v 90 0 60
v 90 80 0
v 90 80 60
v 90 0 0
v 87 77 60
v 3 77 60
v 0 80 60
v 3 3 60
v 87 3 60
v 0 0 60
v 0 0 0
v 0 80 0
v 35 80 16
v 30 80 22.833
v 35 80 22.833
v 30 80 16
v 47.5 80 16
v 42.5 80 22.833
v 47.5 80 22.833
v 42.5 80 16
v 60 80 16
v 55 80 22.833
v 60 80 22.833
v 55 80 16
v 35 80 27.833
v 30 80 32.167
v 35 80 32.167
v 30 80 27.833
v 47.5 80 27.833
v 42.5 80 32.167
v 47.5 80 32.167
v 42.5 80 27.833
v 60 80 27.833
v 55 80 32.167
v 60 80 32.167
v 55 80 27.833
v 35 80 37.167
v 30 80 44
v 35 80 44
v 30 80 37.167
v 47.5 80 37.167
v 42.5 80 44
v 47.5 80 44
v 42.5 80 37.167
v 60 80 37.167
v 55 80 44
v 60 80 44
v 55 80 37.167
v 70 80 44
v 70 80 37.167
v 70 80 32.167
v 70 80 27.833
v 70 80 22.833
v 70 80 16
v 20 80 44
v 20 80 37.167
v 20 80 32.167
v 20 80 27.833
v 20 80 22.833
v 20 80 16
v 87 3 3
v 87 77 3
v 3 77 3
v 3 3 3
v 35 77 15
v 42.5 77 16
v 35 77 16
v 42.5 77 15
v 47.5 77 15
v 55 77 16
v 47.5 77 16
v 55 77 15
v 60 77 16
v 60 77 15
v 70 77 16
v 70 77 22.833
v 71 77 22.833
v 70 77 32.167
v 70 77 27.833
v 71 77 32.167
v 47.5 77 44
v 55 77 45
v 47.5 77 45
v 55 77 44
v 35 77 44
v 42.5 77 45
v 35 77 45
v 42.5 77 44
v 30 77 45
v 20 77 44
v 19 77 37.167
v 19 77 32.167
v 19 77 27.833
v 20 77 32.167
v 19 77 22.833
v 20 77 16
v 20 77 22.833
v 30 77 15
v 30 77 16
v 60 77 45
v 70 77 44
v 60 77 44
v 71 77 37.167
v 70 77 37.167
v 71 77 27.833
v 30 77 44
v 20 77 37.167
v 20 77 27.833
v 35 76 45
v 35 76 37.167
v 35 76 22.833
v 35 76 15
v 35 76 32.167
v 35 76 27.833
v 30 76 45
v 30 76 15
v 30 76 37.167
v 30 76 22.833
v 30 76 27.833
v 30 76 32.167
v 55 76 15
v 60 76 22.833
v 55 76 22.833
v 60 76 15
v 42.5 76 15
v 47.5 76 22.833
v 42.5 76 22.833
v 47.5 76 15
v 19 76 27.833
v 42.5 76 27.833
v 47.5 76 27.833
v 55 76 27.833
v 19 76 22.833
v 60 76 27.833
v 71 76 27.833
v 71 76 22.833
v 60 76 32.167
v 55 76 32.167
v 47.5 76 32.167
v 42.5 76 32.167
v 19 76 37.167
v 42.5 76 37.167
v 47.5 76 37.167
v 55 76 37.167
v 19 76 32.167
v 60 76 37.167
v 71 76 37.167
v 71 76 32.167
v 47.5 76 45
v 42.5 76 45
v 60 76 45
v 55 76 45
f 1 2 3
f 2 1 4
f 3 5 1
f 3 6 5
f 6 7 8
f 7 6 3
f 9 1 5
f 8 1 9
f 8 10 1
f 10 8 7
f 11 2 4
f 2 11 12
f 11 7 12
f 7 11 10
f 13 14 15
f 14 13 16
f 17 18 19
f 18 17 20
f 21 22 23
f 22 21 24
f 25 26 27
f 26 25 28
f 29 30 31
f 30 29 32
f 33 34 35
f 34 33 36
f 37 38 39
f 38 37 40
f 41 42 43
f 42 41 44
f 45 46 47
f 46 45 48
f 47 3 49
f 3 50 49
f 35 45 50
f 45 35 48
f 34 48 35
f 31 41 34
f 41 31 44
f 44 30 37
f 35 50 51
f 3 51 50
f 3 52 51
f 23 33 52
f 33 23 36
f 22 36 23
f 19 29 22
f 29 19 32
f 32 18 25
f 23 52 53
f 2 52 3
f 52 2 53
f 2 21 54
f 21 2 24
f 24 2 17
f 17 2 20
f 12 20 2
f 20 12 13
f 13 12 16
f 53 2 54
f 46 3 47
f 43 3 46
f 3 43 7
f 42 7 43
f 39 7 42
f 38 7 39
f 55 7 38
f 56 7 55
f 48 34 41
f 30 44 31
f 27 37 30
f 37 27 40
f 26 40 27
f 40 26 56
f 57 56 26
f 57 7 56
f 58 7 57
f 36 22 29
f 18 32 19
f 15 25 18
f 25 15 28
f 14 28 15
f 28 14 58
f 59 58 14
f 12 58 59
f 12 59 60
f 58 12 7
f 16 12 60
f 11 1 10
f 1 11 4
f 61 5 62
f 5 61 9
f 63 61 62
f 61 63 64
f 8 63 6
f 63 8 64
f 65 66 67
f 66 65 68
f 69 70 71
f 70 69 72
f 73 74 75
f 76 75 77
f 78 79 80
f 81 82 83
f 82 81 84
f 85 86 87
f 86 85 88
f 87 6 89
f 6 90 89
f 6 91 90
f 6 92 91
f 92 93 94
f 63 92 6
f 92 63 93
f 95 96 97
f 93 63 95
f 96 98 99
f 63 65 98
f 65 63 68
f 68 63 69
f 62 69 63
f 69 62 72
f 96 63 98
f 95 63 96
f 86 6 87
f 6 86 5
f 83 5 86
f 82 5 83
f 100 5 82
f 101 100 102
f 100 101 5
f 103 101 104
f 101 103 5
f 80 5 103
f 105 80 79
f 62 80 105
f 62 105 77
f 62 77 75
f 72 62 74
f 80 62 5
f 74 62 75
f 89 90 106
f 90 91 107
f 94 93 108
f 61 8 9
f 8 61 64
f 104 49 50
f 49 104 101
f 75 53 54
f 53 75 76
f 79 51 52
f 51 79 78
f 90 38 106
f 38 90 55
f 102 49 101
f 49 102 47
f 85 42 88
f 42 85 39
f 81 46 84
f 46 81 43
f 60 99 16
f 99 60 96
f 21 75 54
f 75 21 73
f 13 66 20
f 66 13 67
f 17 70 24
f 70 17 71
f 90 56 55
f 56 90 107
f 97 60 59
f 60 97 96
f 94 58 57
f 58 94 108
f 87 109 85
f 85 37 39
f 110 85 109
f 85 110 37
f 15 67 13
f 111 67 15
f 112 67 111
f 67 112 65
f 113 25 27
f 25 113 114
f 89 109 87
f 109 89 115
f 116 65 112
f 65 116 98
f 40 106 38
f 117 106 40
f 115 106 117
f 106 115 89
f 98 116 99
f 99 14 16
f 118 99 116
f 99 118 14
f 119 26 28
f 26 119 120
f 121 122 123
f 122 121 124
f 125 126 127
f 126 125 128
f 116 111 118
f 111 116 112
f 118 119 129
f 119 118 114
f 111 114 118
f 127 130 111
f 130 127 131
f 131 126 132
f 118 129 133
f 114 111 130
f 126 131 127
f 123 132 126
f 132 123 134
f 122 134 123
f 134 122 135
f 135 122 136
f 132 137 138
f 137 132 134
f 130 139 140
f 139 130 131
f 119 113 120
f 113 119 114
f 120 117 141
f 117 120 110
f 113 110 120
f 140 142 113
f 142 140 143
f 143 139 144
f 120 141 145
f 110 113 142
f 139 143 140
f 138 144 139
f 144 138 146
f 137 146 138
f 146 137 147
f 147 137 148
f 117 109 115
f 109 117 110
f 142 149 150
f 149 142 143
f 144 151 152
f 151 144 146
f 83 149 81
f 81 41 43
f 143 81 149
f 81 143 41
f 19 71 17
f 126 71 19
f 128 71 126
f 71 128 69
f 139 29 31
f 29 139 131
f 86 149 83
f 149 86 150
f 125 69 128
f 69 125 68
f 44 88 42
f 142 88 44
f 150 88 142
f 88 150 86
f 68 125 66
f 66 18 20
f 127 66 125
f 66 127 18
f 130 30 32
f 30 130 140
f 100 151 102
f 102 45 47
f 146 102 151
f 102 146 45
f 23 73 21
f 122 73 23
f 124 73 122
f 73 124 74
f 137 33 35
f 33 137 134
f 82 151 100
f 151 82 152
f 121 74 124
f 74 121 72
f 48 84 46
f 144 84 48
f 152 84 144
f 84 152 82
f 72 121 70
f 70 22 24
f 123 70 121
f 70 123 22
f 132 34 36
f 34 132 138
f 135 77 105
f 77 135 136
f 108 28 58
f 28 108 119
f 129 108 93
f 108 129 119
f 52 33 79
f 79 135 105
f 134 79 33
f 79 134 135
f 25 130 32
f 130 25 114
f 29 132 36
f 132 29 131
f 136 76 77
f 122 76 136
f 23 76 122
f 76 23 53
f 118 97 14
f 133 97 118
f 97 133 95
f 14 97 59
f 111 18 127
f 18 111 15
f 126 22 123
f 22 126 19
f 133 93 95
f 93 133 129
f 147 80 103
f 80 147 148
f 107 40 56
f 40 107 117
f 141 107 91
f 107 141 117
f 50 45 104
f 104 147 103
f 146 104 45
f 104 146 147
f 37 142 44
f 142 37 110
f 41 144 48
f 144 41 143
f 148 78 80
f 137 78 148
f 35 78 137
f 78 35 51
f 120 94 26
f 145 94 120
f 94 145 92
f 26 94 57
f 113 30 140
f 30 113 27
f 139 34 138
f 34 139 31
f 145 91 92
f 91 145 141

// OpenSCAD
$fn = 32;

// ----------------------------------------------------------------------
// Vent box: crossgrid enclosure
// ----------------------------------------------------------------------

// --- parameters (mm) ---
box_l = 90;               // box length, X
box_w = 80;               // box width, Y
box_h = 60;               // box height, Z
wall_t = 3;               // shell wall thickness
win_l = 50;               // vent window width, X
win_h = 28;               // vent window height, Z
bar_w = 5;                // grid bar width
n_v = 3;                  // vertical bar count
n_h = 2;                  // horizontal bar count
fit_tol = 0.1;            // tolerance for press fits, mm
free_tol = 0.3;           // tolerance for clearance fits, mm

win_z0 = (box_h - win_h) / 2;  // window lower edge Z
v_step = win_l / (n_v + 1);  // vertical bar step
h_step = win_h / (n_h + 1);  // horizontal bar step

difference() {
  union() {
    difference() {
      cube([box_l, box_w, box_h]);
  translate([wall_t, wall_t, wall_t])
    cube([box_l - 2 * wall_t, box_w - 2 * wall_t, box_h]);
  translate([(box_l - win_l) / 2, box_w - wall_t - 1, win_z0])
    cube([win_l, wall_t + 2, win_h]);
    }
    for (i = [1 : n_v])
      translate([(box_l - win_l) / 2 + i * v_step - bar_w / 2,
                 box_w - wall_t - 1, win_z0 - 1])
        cube([bar_w, wall_t + 1, win_h + 2]);
    for (i = [1 : n_h])
      translate([(box_l - win_l) / 2 - 1, box_w - wall_t - 1,
                 win_z0 + i * h_step - bar_w / 2])
        cube([win_l + 2, wall_t + 1, bar_w]);
  }
}
